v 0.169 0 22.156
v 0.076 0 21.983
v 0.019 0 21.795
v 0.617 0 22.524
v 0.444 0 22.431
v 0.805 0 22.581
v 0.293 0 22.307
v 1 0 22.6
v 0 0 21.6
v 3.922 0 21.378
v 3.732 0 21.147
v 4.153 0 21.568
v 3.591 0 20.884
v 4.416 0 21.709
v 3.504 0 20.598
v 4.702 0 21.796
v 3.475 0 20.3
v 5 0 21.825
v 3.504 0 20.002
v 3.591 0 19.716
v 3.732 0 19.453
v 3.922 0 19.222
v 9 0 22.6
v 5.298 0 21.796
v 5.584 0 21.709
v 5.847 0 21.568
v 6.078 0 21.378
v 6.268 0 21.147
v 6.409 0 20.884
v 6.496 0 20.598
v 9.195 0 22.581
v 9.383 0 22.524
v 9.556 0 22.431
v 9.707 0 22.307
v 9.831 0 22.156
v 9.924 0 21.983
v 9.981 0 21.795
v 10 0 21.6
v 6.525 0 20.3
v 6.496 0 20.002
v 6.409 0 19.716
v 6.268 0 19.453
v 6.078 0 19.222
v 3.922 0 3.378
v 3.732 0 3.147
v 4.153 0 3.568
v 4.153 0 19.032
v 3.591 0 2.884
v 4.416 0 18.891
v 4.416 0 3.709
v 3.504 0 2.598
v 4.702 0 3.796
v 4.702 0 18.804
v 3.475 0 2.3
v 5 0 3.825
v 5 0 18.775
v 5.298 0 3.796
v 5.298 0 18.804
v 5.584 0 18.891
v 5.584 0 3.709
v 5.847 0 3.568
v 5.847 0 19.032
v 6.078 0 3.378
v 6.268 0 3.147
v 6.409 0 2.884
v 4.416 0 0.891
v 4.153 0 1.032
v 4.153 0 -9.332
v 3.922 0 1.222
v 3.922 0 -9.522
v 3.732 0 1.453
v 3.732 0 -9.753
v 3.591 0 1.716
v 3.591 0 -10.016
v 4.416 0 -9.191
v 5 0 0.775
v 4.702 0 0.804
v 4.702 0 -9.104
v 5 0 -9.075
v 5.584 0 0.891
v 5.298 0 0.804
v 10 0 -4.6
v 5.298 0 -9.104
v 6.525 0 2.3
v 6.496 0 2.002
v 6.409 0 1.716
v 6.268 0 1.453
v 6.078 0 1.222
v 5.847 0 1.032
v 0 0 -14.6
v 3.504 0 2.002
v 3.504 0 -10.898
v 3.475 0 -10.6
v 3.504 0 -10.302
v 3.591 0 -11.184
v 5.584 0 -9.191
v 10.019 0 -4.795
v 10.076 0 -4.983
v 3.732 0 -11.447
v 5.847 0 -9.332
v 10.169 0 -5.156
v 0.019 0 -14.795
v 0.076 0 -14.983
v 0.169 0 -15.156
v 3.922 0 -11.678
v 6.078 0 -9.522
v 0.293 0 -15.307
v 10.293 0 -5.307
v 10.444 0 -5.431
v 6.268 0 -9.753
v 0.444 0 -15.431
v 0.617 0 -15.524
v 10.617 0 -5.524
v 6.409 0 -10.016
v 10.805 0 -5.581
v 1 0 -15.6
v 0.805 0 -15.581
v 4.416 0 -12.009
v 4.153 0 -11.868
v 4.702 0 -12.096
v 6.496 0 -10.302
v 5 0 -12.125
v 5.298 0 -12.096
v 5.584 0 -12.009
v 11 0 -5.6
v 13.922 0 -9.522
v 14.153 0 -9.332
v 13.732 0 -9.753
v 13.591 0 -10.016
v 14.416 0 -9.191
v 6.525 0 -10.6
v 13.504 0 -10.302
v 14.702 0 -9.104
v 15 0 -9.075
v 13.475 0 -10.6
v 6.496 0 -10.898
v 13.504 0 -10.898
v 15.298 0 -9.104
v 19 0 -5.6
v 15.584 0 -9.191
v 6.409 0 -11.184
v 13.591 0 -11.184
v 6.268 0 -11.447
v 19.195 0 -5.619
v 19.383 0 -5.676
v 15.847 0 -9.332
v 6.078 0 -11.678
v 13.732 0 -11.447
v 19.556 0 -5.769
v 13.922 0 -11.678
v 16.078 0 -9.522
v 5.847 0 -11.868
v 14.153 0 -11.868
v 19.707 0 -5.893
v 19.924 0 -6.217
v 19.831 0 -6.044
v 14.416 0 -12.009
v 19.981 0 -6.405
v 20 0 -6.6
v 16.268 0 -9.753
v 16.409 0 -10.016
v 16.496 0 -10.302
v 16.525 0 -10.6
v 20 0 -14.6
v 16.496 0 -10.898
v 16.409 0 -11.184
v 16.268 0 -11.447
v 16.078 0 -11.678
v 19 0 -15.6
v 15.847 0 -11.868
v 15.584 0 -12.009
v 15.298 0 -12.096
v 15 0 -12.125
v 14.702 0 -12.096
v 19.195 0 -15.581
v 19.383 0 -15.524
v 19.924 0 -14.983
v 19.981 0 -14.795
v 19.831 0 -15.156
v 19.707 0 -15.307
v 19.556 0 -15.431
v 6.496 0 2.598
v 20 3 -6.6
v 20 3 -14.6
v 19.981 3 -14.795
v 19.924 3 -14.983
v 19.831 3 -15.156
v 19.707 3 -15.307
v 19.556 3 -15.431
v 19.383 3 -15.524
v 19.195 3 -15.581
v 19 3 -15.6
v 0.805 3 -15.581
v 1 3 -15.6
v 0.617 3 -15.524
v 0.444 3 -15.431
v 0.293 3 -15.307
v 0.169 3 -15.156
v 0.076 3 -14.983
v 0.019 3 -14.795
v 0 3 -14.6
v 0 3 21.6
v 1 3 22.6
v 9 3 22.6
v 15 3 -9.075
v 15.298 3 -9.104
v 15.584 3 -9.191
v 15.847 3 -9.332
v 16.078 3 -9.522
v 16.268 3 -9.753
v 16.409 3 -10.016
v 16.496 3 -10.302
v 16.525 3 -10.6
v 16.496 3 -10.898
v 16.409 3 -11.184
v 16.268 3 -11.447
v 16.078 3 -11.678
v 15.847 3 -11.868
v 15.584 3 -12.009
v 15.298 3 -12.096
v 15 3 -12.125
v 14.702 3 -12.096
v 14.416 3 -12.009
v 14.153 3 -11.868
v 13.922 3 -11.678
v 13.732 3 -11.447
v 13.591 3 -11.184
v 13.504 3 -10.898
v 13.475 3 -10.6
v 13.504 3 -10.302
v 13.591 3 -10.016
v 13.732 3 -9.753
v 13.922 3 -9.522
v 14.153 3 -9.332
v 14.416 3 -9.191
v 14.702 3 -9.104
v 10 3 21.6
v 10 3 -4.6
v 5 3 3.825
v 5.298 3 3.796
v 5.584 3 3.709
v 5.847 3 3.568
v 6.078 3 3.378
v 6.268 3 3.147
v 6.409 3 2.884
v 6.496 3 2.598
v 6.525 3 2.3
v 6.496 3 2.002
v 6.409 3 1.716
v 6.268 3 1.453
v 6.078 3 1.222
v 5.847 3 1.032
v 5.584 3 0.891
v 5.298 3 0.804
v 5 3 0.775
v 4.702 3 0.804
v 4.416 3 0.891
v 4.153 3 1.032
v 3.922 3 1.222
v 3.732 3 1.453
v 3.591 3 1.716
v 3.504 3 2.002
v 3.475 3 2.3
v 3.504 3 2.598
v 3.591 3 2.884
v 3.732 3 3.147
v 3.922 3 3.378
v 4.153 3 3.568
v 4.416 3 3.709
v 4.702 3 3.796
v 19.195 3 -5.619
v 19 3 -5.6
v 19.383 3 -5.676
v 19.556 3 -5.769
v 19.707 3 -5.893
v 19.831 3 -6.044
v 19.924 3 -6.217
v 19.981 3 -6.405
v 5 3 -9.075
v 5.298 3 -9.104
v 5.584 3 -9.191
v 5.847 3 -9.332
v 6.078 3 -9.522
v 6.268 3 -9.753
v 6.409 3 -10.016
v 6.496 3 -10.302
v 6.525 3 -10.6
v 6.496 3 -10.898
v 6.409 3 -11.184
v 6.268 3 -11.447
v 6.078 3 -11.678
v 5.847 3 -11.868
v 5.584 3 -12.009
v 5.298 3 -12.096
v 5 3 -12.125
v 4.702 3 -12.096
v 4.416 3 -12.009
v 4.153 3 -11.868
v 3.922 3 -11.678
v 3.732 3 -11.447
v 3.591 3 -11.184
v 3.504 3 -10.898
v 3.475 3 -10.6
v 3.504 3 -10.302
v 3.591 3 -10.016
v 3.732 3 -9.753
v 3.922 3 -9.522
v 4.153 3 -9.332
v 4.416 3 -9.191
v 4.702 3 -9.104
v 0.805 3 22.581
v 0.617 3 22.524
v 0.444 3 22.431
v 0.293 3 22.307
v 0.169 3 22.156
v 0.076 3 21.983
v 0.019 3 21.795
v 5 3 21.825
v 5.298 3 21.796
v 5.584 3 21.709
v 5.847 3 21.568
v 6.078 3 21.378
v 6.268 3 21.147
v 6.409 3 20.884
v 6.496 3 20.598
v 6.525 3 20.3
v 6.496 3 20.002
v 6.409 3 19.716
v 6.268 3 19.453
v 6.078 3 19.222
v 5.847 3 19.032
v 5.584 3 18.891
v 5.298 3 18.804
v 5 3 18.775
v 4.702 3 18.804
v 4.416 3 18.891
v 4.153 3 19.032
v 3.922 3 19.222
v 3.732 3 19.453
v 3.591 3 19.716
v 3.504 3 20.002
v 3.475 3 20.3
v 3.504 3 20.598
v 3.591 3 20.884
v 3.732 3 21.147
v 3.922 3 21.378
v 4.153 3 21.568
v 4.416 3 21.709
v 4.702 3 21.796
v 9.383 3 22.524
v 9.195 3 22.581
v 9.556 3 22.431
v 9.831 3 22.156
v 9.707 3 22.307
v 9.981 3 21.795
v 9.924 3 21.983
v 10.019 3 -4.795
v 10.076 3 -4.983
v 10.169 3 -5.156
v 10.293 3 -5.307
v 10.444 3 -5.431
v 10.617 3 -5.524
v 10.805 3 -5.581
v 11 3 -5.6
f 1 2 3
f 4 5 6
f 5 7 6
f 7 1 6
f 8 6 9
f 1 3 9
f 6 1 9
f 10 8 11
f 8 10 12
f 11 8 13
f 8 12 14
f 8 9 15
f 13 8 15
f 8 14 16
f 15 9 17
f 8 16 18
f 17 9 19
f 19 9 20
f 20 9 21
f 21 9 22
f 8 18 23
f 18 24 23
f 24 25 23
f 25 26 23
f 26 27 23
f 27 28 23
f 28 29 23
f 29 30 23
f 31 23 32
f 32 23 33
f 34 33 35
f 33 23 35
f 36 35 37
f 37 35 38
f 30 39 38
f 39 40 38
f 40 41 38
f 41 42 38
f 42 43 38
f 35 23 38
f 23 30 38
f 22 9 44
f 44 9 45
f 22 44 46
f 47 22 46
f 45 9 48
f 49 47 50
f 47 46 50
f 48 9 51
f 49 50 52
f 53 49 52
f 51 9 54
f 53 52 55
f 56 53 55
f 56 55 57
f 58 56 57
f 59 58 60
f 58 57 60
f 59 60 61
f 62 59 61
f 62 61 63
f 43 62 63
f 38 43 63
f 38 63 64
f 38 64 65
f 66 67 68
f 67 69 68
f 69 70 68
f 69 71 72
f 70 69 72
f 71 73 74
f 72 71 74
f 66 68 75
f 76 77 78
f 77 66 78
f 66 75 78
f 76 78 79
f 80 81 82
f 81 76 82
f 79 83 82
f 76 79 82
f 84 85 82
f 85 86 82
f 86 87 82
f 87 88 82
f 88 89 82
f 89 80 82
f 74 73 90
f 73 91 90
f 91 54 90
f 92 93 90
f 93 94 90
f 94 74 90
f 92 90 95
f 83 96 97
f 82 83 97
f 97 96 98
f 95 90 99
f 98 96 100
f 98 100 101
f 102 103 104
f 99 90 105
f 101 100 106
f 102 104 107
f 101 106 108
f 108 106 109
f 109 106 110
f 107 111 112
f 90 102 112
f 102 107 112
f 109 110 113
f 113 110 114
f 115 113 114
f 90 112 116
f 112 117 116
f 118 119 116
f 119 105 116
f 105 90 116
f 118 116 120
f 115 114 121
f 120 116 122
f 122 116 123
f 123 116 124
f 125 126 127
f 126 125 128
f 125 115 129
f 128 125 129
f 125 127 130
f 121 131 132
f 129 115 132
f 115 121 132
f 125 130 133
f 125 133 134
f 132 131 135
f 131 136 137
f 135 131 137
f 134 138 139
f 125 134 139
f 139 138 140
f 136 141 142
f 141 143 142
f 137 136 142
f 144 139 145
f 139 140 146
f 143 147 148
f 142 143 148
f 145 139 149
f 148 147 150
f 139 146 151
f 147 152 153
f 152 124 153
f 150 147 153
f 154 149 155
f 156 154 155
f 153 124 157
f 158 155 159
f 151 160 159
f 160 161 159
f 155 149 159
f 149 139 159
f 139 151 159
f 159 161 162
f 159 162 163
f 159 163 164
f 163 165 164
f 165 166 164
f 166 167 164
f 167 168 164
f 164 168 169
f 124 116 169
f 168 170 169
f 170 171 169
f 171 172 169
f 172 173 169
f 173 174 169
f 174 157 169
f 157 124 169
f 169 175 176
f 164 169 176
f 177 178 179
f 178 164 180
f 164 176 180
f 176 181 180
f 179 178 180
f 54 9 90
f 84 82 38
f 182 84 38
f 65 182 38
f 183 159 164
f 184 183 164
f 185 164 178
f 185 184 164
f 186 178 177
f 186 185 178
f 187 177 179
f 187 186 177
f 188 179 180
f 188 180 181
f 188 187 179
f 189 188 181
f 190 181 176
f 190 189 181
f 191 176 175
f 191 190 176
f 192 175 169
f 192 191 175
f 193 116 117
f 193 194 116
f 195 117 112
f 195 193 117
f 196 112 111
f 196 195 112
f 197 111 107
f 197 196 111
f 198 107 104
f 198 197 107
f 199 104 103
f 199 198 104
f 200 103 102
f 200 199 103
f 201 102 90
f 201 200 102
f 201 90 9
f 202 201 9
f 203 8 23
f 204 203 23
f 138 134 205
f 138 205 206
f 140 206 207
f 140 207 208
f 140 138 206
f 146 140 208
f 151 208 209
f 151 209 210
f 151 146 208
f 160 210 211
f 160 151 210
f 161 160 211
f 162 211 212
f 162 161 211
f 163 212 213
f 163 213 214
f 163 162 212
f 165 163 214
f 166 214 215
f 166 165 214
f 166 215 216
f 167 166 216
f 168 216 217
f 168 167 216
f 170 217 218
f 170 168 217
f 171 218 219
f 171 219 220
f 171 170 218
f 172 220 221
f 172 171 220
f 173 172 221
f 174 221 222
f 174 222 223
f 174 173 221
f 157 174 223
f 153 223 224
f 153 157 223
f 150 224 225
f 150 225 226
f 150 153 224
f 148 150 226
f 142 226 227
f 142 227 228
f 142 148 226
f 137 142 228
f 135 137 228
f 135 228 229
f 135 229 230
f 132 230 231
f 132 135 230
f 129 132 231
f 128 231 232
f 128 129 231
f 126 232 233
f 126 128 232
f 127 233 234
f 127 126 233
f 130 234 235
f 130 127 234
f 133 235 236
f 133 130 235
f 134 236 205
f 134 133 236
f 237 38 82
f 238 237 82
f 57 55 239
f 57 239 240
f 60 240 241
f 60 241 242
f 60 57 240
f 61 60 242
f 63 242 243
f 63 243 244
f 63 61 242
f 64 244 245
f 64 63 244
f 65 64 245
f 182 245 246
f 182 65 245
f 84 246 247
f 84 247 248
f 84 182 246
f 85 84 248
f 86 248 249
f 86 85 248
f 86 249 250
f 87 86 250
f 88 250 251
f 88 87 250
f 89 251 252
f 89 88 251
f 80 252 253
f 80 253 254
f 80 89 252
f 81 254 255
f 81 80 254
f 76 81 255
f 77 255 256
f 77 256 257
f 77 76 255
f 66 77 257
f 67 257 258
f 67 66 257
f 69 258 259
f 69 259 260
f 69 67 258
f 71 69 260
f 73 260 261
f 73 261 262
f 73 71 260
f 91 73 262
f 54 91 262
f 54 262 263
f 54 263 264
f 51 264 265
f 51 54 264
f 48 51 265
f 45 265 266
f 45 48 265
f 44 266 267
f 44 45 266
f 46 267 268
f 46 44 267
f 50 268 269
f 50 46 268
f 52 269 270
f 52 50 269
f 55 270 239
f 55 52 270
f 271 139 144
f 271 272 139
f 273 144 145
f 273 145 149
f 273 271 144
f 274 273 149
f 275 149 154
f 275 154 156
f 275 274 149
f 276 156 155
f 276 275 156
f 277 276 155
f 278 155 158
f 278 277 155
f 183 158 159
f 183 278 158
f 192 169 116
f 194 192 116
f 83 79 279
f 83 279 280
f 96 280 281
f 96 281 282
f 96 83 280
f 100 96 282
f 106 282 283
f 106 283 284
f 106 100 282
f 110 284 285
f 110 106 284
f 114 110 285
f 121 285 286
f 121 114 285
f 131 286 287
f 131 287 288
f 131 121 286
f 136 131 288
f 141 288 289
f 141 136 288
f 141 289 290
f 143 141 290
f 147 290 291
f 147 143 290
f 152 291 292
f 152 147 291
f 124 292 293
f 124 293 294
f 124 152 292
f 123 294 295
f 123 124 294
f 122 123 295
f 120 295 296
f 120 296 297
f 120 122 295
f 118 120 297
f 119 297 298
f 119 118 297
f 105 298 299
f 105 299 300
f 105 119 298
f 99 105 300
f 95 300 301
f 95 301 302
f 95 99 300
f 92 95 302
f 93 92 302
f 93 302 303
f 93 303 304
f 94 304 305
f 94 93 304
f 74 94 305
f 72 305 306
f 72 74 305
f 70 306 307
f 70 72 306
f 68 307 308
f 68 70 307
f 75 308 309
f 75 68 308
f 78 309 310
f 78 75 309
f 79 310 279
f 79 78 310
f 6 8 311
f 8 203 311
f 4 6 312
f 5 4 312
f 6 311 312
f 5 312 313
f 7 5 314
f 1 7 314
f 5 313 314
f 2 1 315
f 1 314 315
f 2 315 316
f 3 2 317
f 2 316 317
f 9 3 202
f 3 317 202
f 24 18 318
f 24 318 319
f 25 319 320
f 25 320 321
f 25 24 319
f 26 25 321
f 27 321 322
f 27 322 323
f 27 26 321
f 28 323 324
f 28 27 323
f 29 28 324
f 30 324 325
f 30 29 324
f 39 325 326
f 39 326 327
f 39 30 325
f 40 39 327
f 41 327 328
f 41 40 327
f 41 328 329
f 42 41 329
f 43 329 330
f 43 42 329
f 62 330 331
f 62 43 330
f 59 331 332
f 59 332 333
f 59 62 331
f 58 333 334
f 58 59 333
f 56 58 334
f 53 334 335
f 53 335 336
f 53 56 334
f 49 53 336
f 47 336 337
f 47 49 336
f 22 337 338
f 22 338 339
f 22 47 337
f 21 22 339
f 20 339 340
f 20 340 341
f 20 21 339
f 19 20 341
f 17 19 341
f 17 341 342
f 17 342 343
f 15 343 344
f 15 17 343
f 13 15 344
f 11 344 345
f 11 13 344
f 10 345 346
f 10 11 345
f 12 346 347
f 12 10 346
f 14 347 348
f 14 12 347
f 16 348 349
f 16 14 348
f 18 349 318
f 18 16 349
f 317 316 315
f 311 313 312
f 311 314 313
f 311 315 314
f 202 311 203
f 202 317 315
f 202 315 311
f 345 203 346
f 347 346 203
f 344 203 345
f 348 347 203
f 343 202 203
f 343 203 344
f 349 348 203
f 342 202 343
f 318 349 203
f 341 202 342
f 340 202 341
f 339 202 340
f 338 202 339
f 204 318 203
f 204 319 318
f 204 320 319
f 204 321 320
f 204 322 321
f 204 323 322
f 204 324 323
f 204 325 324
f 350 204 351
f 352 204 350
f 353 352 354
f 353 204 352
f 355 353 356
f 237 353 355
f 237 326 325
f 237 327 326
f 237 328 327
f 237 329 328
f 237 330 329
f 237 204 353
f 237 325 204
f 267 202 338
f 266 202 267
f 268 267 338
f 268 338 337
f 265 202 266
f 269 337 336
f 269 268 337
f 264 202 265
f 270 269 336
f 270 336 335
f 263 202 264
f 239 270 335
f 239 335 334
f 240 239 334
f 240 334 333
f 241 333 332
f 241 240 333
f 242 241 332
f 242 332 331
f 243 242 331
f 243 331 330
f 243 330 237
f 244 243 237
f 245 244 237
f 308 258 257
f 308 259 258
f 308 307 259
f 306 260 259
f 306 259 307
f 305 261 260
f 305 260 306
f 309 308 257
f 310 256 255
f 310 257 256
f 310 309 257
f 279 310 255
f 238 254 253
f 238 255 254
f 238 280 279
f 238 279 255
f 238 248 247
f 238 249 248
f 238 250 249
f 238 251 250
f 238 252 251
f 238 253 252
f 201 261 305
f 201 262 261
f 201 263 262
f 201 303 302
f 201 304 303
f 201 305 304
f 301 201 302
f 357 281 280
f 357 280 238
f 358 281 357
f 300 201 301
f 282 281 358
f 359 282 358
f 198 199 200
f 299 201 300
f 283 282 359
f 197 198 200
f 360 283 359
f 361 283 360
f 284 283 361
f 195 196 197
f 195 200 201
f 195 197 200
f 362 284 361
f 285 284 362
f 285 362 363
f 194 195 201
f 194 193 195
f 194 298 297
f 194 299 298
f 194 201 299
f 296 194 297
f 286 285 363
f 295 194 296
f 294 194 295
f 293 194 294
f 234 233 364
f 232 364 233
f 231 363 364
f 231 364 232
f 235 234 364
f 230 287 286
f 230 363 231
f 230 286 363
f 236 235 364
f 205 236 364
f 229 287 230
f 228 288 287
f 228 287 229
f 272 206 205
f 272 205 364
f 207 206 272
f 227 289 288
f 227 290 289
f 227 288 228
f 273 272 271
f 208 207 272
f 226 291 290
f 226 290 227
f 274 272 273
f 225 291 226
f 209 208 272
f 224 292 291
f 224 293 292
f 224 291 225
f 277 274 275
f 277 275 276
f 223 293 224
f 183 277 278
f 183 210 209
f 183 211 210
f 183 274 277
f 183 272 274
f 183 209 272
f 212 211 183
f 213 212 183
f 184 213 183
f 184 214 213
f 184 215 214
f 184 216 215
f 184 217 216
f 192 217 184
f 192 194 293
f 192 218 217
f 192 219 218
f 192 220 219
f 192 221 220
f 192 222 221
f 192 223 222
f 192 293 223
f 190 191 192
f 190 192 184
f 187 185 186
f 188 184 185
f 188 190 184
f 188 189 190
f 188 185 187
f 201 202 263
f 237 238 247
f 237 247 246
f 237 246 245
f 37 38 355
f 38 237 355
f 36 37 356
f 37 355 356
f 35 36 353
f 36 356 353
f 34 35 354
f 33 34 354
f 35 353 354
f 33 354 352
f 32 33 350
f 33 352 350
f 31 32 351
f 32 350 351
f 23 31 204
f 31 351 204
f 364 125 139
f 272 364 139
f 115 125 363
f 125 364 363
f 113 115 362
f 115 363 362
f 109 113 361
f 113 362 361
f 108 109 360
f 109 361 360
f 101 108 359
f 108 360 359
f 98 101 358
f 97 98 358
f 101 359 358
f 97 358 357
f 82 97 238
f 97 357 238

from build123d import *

# Parameters (mm, degrees)
SKETCH1_R           = 1.525
BOSS_EXTRUDE1_DEPTH = 3
FILLET1_R           = 1


with BuildPart() as part:
    # Sketch1 → Boss-Extrude1 (new body)
    with BuildSketch(Plane(origin=(0, 0, 0), x_dir=(1, 0, 0), z_dir=(0, 1, 0))):
        Polygon((10, 5.6), (20, 5.6), (20, 15.6), (0, 15.6), (0, 0), (0, -22.6), (10, -22.6), align=None)
        with Locations(Location((5, 10.6, 0), (0, 0, 270))):
            Circle(SKETCH1_R, mode=Mode.SUBTRACT)
        with Locations(Location((15, 10.6, 0), (0, 0, 270))):
            Circle(SKETCH1_R, mode=Mode.SUBTRACT)
        with Locations(Location((5, -2.3, 0), (0, 0, 270))):
            Circle(SKETCH1_R, mode=Mode.SUBTRACT)
        with Locations(Location((5, -20.3, 0), (0, 0, 270))):
            Circle(SKETCH1_R, mode=Mode.SUBTRACT)
    extrude(amount=BOSS_EXTRUDE1_DEPTH)

    # Fillet1
    fillet1_edges = [part.edges().sort_by_distance(p)[0] for p in [
        (10, 1.5, 22.6),
        (0, 1.5, 22.6),
        (0, 1.5, -15.6),
        (20, 1.5, -15.6),
        (20, 1.5, -5.6),
        (10, 1.5, -5.6),
    ]]
    fillet(fillet1_edges, radius=FILLET1_R)


solid = part.part
